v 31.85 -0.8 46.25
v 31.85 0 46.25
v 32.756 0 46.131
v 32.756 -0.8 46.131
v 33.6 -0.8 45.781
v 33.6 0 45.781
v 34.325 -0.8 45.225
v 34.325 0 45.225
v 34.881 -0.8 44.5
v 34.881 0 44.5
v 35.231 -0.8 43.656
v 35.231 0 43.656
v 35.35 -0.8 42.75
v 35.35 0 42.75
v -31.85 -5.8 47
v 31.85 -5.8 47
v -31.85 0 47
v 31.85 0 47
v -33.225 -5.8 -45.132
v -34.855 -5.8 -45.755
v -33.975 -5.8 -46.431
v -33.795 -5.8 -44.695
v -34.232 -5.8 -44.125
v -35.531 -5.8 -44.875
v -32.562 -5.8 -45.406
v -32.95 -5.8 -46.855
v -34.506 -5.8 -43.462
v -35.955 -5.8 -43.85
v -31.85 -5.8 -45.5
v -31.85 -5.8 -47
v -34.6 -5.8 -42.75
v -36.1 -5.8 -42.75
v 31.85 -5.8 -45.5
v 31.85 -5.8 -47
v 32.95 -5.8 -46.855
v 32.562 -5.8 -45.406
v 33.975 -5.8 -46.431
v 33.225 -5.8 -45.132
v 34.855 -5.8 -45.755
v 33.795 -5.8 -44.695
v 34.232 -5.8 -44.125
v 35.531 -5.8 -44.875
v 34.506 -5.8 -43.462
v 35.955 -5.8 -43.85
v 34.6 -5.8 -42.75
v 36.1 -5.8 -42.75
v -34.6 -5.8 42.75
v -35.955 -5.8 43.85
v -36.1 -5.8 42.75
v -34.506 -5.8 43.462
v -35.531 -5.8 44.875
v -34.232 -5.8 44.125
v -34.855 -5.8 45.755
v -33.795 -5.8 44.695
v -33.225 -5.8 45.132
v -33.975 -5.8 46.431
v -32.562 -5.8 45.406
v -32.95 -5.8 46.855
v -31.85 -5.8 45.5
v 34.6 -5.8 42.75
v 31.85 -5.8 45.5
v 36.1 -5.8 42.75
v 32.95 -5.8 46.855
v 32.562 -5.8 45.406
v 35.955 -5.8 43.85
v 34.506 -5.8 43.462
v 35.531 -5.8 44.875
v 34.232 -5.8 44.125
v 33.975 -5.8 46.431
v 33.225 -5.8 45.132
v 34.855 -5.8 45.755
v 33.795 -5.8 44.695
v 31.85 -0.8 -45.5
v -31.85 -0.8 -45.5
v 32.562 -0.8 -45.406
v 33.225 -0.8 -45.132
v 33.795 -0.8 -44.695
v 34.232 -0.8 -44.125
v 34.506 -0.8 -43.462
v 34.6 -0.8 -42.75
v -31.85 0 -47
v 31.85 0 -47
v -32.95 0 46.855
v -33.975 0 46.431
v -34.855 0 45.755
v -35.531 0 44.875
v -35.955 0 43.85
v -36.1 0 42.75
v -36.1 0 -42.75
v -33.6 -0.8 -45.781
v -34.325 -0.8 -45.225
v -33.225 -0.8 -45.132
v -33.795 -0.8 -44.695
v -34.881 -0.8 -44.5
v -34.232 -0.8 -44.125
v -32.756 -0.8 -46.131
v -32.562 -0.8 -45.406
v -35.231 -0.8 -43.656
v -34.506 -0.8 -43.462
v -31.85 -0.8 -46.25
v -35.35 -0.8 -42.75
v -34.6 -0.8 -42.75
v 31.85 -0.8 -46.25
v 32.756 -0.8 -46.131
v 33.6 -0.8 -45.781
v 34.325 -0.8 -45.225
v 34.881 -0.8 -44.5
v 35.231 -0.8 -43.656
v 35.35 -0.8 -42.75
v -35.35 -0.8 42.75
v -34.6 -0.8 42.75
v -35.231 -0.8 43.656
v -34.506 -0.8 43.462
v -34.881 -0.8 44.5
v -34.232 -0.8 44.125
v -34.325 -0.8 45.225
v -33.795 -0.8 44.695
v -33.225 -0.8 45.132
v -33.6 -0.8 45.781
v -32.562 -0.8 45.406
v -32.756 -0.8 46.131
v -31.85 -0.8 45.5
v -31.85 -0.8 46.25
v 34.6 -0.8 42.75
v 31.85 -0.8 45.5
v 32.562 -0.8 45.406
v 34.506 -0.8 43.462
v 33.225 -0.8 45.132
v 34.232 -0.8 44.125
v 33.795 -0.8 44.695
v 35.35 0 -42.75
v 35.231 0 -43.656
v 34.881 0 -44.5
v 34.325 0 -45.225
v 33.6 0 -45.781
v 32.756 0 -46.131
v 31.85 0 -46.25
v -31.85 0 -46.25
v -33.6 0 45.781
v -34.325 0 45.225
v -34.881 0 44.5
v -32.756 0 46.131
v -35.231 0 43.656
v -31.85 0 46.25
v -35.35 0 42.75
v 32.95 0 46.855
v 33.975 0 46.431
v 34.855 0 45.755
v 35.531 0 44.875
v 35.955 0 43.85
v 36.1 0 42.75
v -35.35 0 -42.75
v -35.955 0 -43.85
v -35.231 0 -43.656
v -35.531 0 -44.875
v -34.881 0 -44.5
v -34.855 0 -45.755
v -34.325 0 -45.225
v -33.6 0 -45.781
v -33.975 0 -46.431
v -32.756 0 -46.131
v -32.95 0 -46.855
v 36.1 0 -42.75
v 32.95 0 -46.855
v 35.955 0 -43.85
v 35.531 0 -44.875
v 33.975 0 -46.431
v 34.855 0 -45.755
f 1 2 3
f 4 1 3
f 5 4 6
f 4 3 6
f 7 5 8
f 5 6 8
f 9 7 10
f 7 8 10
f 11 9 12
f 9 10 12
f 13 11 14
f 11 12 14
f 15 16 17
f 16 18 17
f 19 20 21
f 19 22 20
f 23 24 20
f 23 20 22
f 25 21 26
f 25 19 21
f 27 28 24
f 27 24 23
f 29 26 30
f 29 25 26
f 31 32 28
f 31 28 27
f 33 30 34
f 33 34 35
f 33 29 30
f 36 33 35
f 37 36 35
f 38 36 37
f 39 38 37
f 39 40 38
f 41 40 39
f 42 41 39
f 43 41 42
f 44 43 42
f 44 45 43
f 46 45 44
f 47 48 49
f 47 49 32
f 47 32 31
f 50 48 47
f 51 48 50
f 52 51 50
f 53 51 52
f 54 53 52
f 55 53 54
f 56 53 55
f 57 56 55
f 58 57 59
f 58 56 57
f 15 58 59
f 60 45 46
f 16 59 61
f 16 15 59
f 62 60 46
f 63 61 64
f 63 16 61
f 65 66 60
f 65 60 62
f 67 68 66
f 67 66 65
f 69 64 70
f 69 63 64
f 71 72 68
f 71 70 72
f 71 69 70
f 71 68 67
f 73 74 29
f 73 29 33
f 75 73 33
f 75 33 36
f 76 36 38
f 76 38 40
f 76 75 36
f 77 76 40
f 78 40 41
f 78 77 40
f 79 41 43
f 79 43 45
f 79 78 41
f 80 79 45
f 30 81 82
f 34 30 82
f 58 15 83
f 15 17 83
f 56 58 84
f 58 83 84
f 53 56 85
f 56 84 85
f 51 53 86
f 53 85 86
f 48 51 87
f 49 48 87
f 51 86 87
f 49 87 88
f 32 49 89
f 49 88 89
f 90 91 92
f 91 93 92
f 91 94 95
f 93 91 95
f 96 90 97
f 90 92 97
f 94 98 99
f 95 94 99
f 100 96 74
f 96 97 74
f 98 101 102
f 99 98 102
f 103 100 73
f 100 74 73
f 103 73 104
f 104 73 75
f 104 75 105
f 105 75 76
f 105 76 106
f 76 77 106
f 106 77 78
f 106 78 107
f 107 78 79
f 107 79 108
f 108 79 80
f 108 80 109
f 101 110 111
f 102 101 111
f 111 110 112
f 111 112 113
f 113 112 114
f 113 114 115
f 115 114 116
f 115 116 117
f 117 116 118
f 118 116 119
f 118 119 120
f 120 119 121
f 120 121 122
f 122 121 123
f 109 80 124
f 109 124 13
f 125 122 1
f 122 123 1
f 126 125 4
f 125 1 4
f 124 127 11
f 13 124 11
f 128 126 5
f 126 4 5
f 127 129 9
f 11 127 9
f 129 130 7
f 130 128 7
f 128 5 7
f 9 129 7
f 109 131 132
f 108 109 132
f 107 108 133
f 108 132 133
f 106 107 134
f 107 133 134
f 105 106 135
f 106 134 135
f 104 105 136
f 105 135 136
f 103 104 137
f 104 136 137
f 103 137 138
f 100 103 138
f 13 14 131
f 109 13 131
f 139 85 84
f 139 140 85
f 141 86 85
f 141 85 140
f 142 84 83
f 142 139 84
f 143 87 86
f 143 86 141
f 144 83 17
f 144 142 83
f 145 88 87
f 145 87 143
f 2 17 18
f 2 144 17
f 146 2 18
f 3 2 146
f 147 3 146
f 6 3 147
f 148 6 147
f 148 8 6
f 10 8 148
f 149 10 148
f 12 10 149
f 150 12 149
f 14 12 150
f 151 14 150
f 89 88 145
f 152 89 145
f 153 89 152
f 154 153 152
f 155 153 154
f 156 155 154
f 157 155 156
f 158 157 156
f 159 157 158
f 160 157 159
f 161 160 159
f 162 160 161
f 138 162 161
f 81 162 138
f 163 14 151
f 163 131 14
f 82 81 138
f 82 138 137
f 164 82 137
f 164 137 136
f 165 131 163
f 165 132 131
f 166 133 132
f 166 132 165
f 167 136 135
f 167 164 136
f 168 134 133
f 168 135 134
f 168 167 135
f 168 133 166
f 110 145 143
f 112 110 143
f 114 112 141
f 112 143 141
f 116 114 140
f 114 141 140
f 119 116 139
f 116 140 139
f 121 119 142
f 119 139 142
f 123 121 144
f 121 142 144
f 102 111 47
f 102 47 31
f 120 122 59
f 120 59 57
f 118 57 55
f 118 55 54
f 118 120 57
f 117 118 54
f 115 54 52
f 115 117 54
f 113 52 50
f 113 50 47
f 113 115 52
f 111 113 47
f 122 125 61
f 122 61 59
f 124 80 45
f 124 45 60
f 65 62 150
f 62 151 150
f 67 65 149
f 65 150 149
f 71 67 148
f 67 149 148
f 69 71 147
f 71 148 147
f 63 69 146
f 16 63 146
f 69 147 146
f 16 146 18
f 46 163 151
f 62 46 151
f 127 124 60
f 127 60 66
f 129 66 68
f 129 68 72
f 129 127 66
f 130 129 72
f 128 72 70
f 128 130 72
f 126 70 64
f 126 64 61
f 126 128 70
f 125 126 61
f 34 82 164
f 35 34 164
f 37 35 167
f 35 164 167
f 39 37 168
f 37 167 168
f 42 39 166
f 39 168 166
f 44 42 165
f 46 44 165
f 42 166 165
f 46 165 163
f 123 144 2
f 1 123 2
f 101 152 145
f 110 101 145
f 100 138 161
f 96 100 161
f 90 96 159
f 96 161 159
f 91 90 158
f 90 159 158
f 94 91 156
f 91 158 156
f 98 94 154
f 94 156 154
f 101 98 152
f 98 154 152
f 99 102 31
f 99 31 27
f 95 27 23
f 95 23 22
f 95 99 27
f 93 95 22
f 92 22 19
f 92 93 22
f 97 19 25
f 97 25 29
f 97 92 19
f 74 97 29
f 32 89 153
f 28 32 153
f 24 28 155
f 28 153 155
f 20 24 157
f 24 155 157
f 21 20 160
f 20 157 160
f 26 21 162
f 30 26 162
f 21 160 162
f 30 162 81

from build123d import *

# Parameters (mm, degrees)
BOSS_EXTRUDE1_DEPTH = 0.8
BOSS_EXTRUDE2_DEPTH = 5


with BuildPart() as part:
    # Sketch1 → Boss-Extrude1 (new body)
    with BuildSketch(Plane(origin=(0, 0, 0), x_dir=(1, 0, 0), z_dir=(0, 1, 0))):
        with BuildLine():
            Line((31.85, 47), (-31.85, 47))
            ThreePointArc((-31.85, 47), (-34.85520382, 45.75520382), (-36.1, 42.75))
            Line((-36.1, 42.75), (-36.1, -42.75))
            ThreePointArc((-36.1, -42.75), (-34.85520382, -45.75520382), (-31.85, -47))
            Line((-31.85, -47), (31.85, -47))
            ThreePointArc((31.85, -47), (34.85520382, -45.75520382), (36.1, -42.75))
            Line((36.1, -42.75), (36.1, 42.75))
            ThreePointArc((36.1, 42.75), (34.85520382, 45.75520382), (31.85, 47))
        make_face()
        with BuildLine():
            Line((35.35, -42.75), (35.35, 42.75))
            ThreePointArc((35.35, 42.75), (34.324873734, 45.224873734), (31.85, 46.25))
            Line((31.85, 46.25), (-31.85, 46.25))
            ThreePointArc((-31.85, 46.25), (-34.324873734, 45.224873734), (-35.35, 42.75))
            Line((-35.35, 42.75), (-35.35, -42.75))
            ThreePointArc((-35.35, -42.75), (-34.324873734, -45.224873734), (-31.85, -46.25))
            Line((-31.85, -46.25), (31.85, -46.25))
            ThreePointArc((31.85, -46.25), (34.324873734, -45.224873734), (35.35, -42.75))
        make_face(mode=Mode.SUBTRACT)
    extrude(amount=-BOSS_EXTRUDE1_DEPTH)

    # Sketch2 → Boss-Extrude2 (add)
    with BuildSketch(Plane.XZ.offset(0.8)):
        with BuildLine():
            Line((36.1, -42.75), (36.1, 42.75))
            ThreePointArc((36.1, 42.75), (34.85520382, 45.75520382), (31.85, 47))
            Line((31.85, 47), (-31.85, 47))
            ThreePointArc((-31.85, 47), (-34.85520382, 45.75520382), (-36.1, 42.75))
            Line((-36.1, 42.75), (-36.1, -42.75))
            ThreePointArc((-36.1, -42.75), (-34.85520382, -45.75520382), (-31.85, -47))
            Line((-31.85, -47), (31.85, -47))
            ThreePointArc((31.85, -47), (34.85520382, -45.75520382), (36.1, -42.75))
        make_face()
        with BuildLine():
            Line((-34.6, 42.75), (-34.6, -42.75))
            ThreePointArc((-34.6, -42.75), (-33.794543648, -44.694543648), (-31.85, -45.5))
            Line((-31.85, -45.5), (31.85, -45.5))
            ThreePointArc((31.85, -45.5), (33.794543648, -44.694543648), (34.6, -42.75))
            Line((34.6, -42.75), (34.6, 42.75))
            ThreePointArc((34.6, 42.75), (33.794543648, 44.694543648), (31.85, 45.5))
            Line((31.85, 45.5), (-31.85, 45.5))
            ThreePointArc((-31.85, 45.5), (-33.794543648, 44.694543648), (-34.6, 42.75))
        make_face(mode=Mode.SUBTRACT)
    extrude(amount=BOSS_EXTRUDE2_DEPTH)


solid = part.part
